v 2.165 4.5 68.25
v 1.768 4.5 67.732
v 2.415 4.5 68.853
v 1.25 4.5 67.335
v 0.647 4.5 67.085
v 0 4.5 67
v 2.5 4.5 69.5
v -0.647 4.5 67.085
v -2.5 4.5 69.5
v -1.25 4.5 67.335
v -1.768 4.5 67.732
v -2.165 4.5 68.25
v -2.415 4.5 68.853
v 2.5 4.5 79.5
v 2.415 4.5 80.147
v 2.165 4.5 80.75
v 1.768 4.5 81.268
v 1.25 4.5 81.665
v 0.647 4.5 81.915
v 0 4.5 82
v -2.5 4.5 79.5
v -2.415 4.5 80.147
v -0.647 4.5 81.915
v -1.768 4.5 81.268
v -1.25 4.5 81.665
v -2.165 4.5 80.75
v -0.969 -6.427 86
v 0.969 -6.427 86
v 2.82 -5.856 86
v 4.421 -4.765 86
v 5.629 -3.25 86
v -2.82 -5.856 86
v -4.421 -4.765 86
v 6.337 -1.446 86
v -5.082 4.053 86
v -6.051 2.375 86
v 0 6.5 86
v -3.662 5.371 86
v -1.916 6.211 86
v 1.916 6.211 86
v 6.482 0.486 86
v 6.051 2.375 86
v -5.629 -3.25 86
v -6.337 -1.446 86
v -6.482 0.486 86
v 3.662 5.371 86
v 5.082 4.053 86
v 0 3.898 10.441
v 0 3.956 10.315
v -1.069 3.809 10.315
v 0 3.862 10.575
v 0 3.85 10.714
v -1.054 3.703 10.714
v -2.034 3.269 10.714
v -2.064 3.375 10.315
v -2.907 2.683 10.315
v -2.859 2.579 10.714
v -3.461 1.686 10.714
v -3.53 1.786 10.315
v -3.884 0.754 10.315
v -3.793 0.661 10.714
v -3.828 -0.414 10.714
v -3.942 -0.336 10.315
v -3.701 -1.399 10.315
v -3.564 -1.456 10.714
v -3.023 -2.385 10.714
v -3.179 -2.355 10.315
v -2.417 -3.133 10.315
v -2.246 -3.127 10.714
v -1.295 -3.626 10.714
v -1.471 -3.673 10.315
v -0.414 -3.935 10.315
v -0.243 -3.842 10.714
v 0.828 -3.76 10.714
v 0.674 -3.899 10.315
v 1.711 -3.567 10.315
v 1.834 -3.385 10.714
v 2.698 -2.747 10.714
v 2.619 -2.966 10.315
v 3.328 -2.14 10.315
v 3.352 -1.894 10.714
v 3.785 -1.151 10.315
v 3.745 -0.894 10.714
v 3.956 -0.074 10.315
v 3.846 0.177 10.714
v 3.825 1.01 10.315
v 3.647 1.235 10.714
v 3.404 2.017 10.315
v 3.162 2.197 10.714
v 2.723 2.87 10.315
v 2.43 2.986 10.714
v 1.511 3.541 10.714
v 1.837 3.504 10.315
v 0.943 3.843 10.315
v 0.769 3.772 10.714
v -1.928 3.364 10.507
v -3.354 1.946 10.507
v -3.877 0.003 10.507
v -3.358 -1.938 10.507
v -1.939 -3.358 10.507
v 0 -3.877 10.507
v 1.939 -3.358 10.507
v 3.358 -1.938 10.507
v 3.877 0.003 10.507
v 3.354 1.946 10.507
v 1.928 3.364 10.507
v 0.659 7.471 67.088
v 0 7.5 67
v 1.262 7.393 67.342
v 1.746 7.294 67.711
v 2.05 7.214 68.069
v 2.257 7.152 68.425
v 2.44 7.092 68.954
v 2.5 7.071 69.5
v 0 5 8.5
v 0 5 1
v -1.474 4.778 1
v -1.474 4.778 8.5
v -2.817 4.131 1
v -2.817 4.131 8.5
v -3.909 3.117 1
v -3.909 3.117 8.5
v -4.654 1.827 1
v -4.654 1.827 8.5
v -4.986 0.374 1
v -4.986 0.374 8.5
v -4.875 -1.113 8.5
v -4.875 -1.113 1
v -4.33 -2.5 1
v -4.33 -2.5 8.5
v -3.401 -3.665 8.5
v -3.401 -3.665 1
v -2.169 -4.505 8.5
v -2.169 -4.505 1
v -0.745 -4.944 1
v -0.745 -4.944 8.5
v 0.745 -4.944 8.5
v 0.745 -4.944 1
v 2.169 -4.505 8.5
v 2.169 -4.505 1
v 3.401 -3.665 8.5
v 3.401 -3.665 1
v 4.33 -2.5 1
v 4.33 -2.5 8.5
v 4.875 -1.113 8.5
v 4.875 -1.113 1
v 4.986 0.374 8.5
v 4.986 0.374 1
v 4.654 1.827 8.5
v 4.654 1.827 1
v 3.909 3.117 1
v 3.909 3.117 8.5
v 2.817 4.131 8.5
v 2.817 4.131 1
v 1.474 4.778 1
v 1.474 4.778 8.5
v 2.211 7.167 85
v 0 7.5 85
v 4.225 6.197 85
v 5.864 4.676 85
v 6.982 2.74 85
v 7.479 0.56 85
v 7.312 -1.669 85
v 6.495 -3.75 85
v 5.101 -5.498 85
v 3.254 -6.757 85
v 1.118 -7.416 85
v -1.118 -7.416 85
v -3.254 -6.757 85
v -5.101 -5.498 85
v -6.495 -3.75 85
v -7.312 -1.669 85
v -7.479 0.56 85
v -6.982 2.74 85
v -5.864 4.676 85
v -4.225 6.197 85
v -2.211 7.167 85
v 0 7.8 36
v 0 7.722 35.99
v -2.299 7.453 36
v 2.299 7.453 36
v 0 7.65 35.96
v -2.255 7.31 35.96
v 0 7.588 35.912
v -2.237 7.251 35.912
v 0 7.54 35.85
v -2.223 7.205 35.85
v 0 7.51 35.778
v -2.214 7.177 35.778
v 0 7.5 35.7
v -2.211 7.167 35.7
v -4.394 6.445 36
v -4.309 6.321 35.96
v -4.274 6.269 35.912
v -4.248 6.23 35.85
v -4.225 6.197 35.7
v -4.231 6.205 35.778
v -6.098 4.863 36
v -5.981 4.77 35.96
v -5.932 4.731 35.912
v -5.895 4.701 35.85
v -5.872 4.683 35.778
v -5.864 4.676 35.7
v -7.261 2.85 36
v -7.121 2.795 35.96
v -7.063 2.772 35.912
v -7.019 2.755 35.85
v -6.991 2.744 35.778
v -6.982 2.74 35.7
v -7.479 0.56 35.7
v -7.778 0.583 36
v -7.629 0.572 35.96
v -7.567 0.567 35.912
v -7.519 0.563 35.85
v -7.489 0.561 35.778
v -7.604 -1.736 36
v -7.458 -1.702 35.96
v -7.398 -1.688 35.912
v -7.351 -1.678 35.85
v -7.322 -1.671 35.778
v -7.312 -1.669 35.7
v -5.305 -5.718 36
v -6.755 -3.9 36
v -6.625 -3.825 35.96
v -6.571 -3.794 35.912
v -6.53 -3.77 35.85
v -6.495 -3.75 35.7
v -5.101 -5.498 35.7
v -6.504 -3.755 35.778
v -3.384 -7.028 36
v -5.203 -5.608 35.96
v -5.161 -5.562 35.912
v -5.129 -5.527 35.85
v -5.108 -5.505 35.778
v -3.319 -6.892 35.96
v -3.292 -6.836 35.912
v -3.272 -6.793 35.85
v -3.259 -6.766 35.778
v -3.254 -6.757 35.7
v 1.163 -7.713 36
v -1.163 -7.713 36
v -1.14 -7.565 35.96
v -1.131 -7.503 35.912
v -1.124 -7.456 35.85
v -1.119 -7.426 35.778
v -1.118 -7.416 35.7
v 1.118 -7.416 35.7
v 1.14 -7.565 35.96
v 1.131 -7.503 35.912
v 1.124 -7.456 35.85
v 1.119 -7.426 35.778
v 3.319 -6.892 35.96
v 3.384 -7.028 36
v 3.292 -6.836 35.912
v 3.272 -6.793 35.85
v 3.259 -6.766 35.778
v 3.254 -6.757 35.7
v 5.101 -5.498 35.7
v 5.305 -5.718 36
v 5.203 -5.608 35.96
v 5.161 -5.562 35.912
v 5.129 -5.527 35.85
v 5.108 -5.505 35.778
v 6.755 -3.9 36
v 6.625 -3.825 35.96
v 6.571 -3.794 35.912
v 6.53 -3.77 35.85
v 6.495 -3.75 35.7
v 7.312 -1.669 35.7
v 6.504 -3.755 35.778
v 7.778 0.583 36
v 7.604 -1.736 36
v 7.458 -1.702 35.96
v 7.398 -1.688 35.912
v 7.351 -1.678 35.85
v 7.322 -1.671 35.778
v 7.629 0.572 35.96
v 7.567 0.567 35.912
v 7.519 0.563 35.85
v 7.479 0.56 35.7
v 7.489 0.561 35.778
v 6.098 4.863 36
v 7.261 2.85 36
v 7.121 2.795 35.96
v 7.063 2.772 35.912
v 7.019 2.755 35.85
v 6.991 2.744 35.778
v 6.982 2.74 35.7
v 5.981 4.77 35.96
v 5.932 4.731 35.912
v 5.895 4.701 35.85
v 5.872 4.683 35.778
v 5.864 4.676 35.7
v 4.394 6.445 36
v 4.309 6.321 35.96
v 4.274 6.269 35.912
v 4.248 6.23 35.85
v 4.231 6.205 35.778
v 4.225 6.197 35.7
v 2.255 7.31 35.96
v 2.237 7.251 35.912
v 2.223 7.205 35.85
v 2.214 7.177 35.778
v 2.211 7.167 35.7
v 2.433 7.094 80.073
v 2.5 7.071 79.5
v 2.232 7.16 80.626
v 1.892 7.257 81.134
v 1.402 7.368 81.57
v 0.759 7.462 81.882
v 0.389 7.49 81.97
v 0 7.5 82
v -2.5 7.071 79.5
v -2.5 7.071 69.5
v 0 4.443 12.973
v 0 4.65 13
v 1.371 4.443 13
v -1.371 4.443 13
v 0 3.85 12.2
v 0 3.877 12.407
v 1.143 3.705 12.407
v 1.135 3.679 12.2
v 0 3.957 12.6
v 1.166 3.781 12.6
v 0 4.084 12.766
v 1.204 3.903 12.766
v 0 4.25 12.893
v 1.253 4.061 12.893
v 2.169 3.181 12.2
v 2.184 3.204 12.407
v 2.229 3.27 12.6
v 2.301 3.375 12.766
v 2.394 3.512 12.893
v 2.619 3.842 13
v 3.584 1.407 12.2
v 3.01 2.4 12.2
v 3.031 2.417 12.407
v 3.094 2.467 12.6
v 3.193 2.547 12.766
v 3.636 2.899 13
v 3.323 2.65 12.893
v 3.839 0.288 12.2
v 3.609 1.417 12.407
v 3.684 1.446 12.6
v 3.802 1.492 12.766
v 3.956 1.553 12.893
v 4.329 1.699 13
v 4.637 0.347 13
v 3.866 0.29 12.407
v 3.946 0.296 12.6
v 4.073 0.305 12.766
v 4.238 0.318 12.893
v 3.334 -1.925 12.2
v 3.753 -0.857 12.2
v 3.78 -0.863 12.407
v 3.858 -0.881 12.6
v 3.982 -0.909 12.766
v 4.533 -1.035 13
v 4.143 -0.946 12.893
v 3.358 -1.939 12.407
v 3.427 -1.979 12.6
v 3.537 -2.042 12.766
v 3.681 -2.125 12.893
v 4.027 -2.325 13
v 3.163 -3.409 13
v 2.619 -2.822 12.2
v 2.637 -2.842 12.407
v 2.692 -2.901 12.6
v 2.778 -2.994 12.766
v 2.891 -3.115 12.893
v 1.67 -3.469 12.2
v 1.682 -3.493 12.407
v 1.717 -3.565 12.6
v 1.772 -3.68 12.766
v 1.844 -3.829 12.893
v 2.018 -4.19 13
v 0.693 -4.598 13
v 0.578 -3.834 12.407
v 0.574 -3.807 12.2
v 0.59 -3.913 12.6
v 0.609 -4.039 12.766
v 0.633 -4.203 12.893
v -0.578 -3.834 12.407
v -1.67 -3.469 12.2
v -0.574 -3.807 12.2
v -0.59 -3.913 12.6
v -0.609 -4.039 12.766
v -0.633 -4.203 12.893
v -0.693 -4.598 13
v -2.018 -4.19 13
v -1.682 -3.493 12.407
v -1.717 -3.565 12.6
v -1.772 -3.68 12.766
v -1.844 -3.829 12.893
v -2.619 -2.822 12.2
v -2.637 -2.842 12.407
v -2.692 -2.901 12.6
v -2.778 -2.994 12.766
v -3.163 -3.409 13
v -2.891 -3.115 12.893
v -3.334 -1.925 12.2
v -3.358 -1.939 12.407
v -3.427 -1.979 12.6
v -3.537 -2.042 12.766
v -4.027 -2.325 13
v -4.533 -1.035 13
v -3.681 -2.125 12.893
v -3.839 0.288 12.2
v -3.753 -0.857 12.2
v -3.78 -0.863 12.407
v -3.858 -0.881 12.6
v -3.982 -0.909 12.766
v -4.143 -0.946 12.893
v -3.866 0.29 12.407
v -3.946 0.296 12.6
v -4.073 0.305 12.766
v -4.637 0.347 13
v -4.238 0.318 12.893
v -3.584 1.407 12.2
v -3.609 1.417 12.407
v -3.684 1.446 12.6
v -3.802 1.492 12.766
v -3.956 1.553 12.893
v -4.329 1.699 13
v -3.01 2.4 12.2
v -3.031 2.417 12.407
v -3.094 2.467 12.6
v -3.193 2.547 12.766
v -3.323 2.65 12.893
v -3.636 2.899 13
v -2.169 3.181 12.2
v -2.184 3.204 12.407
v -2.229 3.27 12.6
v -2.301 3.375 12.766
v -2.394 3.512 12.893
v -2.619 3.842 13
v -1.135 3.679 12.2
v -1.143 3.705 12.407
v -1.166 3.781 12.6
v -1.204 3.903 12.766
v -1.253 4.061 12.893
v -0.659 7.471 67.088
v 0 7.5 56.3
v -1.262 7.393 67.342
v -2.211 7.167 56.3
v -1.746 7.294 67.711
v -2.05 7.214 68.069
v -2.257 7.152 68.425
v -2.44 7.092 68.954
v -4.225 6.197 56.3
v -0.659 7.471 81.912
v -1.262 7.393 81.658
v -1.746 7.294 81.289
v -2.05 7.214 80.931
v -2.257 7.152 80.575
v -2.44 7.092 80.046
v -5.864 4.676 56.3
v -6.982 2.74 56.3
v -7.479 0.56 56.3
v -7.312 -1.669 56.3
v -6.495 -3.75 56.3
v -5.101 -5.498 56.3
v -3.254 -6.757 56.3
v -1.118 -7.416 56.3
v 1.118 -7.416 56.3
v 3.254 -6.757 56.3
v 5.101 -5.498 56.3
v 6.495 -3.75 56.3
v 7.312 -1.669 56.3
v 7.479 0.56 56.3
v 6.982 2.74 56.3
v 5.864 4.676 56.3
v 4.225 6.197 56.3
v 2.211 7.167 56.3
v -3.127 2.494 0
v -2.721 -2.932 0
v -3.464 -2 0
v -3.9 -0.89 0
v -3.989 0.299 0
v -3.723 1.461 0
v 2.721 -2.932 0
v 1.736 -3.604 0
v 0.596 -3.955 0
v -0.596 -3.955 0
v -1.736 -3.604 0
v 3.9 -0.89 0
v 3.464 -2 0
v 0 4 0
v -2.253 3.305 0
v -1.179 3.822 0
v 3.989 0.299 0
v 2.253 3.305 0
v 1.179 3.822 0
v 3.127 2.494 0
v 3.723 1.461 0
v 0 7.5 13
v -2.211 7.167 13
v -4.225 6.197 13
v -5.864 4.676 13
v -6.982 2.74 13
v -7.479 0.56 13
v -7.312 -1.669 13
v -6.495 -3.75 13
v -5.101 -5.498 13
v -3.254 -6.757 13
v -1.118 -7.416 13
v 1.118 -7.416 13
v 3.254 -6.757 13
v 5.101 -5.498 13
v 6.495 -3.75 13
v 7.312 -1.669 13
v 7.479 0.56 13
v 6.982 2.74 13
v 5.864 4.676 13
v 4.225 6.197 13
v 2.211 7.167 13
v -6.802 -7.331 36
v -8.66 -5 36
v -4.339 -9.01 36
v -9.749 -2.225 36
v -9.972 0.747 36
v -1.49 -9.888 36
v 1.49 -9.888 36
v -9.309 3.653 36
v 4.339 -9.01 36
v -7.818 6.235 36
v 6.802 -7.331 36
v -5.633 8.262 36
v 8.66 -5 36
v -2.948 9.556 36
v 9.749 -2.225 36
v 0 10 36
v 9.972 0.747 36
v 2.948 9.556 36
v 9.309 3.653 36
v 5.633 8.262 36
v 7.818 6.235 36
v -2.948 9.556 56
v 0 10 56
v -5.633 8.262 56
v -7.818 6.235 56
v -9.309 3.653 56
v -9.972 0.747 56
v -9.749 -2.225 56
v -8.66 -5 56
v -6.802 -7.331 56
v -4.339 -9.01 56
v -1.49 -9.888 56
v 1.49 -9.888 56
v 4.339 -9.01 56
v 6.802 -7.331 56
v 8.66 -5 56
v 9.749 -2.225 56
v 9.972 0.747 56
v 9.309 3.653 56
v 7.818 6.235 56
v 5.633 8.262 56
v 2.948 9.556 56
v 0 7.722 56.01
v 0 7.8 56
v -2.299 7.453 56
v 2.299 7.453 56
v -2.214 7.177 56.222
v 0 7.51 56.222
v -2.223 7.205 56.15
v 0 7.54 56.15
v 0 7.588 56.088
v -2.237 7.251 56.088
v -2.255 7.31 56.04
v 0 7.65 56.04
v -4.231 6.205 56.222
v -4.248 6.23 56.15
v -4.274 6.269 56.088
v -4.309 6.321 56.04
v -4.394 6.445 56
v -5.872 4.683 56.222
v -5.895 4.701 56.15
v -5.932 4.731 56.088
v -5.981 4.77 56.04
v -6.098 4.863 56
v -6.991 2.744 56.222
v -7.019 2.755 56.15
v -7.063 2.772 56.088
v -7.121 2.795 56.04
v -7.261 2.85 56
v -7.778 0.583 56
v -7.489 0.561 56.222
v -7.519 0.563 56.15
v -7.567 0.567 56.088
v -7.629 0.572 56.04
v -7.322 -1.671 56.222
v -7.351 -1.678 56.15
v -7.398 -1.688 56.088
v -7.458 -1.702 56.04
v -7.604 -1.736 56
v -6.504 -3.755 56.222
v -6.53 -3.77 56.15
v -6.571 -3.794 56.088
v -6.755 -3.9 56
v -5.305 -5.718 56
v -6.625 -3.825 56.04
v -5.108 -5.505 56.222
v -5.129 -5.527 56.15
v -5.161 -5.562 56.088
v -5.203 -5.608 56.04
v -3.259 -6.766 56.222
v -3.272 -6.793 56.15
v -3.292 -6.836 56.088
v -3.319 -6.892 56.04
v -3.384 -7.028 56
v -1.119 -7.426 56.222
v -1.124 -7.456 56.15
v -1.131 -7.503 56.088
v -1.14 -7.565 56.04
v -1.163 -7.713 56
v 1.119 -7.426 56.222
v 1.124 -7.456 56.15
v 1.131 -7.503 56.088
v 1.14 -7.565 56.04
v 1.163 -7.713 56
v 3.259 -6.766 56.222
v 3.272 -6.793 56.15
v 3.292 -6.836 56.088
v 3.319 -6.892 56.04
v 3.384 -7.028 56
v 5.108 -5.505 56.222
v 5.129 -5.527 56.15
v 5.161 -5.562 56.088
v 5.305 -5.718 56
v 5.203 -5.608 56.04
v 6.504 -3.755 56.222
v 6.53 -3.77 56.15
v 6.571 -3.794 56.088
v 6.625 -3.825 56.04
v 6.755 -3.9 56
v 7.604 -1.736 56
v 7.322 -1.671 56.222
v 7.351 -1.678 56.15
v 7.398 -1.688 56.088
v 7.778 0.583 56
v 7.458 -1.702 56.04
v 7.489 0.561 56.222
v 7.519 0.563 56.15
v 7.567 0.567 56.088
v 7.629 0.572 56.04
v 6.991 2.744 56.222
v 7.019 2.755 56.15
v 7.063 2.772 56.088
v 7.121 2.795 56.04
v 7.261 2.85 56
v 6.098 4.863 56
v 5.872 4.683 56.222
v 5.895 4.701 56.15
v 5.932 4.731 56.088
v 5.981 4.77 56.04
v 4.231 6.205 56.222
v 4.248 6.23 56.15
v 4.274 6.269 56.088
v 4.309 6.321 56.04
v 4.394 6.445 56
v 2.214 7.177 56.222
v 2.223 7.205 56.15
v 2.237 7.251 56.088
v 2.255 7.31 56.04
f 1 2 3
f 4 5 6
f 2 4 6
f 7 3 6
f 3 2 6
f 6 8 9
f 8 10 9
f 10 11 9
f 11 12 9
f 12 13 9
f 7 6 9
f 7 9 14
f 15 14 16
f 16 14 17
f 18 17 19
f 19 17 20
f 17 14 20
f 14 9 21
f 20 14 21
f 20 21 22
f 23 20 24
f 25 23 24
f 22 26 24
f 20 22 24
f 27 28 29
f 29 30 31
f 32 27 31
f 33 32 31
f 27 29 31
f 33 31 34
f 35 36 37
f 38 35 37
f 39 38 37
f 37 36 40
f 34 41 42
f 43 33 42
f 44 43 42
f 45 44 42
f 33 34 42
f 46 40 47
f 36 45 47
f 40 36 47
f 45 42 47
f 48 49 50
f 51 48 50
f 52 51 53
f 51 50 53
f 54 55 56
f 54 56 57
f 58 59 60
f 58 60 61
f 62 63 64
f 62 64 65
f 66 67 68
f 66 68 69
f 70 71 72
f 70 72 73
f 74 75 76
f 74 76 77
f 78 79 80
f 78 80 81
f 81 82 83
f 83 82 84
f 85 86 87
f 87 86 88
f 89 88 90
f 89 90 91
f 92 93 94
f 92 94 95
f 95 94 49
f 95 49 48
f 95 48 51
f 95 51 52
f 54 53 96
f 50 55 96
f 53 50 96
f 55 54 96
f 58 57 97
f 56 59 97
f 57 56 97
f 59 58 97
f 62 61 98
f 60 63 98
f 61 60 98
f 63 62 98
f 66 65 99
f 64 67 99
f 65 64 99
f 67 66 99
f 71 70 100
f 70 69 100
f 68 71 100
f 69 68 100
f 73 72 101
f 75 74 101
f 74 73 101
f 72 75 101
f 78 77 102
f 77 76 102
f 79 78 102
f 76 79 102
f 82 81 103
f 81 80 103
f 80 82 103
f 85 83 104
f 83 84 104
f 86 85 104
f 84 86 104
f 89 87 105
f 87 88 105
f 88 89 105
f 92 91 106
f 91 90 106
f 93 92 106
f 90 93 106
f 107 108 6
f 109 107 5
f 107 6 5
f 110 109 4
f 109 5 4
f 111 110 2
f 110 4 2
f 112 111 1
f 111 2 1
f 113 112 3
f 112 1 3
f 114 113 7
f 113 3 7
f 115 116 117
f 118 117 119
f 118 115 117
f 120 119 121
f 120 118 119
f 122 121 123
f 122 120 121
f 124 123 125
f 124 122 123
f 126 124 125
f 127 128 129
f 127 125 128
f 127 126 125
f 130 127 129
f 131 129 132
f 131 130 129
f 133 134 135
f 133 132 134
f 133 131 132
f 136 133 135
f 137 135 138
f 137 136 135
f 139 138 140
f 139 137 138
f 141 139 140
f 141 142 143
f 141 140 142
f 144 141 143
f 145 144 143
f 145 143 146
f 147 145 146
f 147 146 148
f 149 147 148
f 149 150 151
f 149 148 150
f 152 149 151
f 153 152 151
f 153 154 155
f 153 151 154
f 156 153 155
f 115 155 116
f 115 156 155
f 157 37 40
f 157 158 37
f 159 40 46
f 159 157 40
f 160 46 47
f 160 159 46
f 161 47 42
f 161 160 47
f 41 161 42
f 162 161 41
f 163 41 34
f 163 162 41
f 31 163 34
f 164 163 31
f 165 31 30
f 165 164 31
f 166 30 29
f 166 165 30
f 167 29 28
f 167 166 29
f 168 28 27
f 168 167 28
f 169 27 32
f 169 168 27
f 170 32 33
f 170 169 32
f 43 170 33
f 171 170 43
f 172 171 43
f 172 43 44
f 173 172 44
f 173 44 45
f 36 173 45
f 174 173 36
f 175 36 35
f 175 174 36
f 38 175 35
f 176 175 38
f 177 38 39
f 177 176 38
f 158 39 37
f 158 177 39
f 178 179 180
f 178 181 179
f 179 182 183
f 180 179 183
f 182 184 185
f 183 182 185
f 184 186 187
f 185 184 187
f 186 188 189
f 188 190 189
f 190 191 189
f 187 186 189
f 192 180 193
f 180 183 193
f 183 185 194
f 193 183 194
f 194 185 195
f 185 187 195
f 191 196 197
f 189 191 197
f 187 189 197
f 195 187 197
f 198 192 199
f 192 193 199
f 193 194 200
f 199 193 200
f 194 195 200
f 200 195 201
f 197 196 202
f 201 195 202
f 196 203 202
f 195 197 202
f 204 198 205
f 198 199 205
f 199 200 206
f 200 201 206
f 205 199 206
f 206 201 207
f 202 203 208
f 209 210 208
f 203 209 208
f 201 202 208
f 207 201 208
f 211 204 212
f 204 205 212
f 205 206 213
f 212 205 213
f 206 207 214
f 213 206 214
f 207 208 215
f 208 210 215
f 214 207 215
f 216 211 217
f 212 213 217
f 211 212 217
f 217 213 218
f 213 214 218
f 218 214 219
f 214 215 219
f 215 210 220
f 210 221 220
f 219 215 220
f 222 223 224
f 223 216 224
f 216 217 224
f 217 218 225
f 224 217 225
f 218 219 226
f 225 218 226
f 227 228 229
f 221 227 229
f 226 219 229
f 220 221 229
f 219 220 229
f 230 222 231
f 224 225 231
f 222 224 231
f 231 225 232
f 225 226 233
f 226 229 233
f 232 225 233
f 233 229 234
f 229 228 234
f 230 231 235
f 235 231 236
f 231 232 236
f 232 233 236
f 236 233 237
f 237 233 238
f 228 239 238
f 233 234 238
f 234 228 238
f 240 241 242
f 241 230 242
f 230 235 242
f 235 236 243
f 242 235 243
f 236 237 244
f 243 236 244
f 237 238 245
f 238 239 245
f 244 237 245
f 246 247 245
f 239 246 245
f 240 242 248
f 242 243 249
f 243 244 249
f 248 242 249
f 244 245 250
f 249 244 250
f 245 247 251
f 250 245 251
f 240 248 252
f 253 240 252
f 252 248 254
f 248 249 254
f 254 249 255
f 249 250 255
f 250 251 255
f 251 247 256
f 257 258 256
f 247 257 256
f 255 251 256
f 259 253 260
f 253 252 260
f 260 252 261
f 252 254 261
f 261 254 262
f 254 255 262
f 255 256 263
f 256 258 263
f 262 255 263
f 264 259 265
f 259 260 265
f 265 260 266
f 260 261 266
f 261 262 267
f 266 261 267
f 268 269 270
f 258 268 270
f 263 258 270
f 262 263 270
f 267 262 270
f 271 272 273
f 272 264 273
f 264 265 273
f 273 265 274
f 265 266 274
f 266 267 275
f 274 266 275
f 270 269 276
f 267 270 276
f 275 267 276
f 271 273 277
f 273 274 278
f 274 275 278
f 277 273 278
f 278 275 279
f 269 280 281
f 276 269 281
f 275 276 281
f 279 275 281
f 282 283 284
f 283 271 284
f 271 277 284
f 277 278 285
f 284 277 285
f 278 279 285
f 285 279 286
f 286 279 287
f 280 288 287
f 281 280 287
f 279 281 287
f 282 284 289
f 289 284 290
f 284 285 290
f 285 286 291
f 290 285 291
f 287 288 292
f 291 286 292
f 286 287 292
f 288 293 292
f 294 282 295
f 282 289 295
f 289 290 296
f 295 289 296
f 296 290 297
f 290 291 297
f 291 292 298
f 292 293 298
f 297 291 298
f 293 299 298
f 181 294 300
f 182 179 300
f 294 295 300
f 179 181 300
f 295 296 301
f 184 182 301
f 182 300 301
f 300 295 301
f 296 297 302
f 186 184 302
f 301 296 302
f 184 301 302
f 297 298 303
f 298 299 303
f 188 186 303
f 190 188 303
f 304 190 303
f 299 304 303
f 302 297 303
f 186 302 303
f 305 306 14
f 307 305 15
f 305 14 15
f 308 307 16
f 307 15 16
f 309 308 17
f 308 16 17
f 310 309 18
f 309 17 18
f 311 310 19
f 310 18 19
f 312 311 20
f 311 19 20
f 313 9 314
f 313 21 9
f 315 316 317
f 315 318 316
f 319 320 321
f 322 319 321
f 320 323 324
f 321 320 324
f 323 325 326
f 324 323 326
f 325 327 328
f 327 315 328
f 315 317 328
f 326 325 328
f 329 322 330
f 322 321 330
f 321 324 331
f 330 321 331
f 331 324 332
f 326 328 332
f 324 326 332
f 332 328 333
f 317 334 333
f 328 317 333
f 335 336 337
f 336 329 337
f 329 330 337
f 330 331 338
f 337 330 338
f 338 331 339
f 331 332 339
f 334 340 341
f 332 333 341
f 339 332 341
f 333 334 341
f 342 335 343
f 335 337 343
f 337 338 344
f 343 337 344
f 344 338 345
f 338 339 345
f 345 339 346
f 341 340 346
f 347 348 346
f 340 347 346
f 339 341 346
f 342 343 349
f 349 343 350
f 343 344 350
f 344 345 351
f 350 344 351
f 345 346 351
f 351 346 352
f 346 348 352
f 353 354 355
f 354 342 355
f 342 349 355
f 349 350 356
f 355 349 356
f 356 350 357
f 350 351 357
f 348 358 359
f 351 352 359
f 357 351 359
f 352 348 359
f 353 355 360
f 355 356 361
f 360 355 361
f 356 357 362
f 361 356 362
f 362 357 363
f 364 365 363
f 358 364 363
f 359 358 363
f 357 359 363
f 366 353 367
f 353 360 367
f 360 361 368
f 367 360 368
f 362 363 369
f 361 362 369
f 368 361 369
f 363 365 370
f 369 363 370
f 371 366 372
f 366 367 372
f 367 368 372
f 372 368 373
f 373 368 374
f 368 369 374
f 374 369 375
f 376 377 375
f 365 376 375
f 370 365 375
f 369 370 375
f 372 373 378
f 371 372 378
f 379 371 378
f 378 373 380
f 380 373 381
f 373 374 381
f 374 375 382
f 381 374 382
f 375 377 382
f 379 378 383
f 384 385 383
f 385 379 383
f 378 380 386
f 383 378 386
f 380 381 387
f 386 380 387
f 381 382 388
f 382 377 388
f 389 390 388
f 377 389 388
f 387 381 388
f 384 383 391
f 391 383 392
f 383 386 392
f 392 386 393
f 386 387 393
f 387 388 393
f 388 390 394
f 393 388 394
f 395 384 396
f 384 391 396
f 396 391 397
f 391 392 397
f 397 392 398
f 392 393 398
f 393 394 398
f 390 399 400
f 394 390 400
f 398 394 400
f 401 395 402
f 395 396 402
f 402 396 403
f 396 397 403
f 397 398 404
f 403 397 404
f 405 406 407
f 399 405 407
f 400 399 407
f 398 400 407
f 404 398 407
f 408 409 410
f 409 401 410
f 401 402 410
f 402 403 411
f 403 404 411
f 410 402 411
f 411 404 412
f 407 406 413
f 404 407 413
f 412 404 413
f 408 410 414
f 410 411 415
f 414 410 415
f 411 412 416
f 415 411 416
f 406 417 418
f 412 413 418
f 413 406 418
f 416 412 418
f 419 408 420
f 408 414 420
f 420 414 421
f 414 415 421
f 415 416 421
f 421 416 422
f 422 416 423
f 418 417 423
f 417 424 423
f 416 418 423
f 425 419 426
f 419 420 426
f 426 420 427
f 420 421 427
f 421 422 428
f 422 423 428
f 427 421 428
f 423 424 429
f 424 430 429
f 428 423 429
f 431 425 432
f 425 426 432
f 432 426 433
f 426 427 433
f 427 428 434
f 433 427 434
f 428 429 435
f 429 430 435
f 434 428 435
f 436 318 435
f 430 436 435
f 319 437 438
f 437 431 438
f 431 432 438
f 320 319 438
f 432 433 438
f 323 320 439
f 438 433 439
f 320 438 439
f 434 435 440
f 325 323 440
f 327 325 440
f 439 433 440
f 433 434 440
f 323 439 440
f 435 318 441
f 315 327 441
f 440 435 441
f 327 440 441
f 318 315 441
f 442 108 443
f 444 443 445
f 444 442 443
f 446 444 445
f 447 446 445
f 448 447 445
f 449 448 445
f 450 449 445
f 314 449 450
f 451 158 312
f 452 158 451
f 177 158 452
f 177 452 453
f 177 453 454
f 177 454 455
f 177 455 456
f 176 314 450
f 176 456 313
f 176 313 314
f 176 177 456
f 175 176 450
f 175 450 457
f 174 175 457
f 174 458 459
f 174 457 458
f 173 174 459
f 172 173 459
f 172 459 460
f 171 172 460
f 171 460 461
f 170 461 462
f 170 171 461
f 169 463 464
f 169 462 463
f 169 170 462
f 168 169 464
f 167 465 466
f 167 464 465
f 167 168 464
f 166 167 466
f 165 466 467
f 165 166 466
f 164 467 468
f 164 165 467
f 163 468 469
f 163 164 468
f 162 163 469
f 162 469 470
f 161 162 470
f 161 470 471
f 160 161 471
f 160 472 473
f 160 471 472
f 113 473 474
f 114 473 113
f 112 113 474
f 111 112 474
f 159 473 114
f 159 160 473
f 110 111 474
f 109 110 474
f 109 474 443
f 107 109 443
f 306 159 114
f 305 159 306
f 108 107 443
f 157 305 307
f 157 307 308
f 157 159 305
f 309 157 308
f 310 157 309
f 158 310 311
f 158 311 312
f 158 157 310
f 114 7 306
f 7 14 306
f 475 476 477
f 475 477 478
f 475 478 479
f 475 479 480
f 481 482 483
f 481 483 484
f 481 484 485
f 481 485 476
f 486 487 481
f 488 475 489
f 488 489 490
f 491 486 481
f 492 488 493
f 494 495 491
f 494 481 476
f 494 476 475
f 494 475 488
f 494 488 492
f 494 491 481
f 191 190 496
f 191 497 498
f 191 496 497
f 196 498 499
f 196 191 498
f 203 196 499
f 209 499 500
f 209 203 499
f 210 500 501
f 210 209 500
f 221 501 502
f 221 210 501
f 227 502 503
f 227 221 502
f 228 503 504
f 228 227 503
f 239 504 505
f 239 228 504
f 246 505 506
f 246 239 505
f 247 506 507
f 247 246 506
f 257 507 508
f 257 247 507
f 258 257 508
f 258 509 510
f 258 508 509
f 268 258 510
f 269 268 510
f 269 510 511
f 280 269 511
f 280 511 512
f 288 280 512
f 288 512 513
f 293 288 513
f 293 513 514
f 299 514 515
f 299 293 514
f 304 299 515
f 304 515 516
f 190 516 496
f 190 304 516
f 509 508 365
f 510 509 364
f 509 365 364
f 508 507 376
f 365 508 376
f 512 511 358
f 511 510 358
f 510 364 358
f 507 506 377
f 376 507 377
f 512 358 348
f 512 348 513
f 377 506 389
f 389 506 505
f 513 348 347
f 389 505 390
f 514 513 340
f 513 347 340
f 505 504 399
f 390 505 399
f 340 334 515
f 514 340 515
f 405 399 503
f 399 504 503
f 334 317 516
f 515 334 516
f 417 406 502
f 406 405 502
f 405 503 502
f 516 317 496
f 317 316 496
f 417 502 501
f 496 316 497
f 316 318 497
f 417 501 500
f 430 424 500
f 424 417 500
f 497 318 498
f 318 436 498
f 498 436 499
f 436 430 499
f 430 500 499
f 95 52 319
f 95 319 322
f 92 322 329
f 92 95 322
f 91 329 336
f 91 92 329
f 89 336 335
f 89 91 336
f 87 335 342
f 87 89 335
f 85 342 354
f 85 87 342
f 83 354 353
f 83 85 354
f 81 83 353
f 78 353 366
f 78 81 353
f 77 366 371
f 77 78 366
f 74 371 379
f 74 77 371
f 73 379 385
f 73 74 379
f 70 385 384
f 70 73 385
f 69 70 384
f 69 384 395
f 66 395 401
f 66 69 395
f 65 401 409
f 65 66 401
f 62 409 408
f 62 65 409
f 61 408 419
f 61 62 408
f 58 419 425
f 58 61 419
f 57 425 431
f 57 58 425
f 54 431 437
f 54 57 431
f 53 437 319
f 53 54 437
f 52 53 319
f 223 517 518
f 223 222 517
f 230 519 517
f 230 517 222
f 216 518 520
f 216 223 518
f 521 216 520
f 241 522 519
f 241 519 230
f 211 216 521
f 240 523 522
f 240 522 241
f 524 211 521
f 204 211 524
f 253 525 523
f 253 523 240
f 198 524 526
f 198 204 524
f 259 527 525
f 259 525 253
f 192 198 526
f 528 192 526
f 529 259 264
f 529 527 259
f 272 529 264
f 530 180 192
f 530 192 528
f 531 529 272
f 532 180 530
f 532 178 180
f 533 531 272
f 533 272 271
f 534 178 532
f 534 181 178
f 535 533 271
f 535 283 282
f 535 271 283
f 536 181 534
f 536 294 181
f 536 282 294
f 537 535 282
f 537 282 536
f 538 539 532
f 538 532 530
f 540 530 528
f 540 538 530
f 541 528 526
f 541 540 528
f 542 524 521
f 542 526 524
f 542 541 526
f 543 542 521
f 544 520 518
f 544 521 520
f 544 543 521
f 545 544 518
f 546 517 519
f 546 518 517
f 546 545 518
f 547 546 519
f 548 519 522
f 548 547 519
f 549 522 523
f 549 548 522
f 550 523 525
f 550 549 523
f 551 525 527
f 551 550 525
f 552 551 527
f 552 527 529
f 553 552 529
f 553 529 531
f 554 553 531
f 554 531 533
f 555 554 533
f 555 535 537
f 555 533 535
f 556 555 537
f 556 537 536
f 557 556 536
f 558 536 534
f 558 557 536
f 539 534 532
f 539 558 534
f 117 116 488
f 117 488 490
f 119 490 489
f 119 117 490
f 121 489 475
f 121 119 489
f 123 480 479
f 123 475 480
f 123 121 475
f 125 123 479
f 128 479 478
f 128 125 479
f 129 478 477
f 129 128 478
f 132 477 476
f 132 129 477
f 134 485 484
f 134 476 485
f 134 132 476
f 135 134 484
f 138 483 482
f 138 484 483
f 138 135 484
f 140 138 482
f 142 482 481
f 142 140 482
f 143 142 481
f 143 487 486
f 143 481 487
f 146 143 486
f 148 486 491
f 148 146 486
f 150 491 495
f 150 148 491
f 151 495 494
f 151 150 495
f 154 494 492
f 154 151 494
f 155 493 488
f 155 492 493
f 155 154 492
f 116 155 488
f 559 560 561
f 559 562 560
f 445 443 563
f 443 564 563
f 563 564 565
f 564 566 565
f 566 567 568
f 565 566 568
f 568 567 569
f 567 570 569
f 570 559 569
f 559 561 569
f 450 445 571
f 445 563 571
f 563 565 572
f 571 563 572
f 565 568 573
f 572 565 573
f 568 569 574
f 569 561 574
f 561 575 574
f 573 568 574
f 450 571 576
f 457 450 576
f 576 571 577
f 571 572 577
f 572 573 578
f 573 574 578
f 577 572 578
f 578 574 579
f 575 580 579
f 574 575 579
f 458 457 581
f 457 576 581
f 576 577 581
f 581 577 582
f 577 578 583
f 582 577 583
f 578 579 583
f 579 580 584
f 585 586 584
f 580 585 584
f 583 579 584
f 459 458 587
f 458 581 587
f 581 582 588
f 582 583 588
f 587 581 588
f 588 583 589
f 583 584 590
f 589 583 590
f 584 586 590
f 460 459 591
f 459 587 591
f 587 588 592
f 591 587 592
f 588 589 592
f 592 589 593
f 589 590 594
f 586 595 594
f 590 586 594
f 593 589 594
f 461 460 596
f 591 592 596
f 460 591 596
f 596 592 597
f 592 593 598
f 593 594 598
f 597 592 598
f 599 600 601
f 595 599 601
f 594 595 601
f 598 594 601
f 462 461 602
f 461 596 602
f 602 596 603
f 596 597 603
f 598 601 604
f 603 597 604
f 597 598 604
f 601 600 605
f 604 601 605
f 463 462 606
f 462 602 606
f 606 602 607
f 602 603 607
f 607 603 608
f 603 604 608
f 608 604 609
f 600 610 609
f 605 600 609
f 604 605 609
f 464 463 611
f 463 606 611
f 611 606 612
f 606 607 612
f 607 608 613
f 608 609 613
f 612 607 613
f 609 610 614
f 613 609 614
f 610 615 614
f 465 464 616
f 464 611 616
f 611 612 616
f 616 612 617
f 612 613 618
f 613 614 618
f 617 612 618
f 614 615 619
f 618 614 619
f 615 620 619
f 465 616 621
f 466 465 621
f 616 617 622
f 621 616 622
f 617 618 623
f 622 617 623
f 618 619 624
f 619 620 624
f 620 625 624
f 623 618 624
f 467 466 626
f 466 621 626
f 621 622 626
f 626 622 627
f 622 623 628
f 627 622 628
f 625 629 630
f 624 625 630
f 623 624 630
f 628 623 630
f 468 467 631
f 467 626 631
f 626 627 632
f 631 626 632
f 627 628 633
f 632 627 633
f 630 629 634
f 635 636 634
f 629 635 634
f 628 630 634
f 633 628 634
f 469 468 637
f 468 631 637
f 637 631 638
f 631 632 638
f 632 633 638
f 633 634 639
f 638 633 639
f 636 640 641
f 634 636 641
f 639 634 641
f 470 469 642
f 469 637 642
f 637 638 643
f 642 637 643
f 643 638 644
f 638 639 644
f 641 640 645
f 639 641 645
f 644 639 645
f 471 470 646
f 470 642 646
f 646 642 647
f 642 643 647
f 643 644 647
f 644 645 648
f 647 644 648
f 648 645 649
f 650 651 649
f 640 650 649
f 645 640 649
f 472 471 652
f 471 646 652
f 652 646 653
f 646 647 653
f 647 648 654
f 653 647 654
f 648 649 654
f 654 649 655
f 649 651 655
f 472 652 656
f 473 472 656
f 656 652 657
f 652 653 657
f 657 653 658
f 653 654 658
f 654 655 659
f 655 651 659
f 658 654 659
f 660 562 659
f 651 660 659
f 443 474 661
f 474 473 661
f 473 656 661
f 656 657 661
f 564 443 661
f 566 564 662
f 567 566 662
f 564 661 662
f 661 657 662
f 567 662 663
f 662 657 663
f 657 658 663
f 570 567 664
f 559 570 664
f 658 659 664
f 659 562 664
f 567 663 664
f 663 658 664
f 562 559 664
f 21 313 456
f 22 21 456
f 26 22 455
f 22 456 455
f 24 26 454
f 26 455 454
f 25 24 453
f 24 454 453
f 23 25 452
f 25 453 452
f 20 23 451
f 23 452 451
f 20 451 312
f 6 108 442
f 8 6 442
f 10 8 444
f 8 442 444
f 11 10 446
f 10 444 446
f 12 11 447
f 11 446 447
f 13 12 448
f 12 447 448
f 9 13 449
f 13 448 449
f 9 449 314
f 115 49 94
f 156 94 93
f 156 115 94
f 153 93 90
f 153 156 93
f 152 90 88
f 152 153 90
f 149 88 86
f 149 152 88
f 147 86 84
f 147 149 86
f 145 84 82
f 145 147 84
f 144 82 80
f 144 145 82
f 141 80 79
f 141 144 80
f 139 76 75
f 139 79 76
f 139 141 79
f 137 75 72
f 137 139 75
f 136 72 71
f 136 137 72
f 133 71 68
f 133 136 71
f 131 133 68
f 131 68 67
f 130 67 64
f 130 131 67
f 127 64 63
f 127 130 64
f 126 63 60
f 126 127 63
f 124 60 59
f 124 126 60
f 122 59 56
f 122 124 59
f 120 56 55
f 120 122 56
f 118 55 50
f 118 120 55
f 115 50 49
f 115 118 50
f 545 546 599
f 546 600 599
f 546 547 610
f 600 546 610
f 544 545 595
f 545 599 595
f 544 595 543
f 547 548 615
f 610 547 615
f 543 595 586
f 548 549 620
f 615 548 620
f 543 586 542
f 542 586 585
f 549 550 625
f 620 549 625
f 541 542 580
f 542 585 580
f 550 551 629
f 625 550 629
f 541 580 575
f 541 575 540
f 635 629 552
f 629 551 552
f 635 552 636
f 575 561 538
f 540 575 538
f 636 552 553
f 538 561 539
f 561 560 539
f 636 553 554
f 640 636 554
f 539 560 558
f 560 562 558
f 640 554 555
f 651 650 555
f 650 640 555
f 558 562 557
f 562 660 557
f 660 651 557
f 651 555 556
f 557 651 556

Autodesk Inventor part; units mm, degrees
ref_plane "YZ Plane" through (0, 0, 0) normal (1, 0, 0) x (0, 1, 0)
ref_plane "XZ Plane" through (0, 0, 0) normal (0, 1, 0) x (-1, 0, 0)
ref_plane "XY Plane" through (0, 0, 0) normal (0, 0, 1) x (1, 0, 0)
sketch "스케치1" plane through (0, 0, 0) normal (1, 0, 0) x (0, 1, 0)
  line L0 (0, 0) -> (5, 0)
  line L1 (5, 0) -> (5, 13)
  line L2 (5, 13) -> (0, 13)
  line L3 (0, 13) -> (0, 0)
  line L4 (0, 13) -> (7.5, 13)
  line L5 (7.5, 13) -> (7.5, 36)
  line L6 (7.5, 36) -> (0, 36)
  line L7 (0, 36) -> (0, 13)
  line L8 (0, 36) -> (10, 36)
  line L9 (10, 36) -> (10, 56)
  line L10 (10, 56) -> (0, 56)
  line L11 (0, 56) -> (0, 36)
  line L12 (0, 56) -> (7.5, 56)
  line L13 (7.5, 56) -> (7.5, 86)
  line L14 (7.5, 86) -> (0, 86)
  line L15 (0, 86) -> (0, 56)
  dimension "d0" = 10
  dimension "d1" = 15
  dimension "d2" = 20
  dimension "d3" = 15
  dimension "d4" = 13
  dimension "d5" = 23
  dimension "d6" = 20
  dimension "d7" = 30
revolve "회전1" add sketch "스케치1" angle 360 about axis through (0, 0, 36) along (0, 0, -1)
sketch "스케치2" plane through (0, 0, 0) normal (1, 0, 0) x (0, 1, 0)
  line L0 (5, 8.5) -> (5, 13)
  line L1 (5, 13) -> (3.85, 13)
  line L2 (3.85, 13) -> (3.85, 10.5)
  line L3 (3.85, 10.5) -> (5, 8.5)
  line L4 (-5, 13) -> (5, 13) projected
  line L5 (0, -17.2) -> (0, 103.2) projected
  point P0 (0, 0)
  dimension "d9" = 4.5
  dimension "d10" = 1.15
  dimension "d11" = 2.5
revolve "회전3" cut sketch "스케치2" angle 360 about axis through (0, 0, -10) along (0, 0, 1)
fillet "모깎기1" radius 0.8 2 edges at (0, -3.85, 10.5) (0, -3.85, 13)
thread "스레드1" size "M10x1.5" class "6g" standard "ANSI Metric M Profile" full length
chamfer "모따기1" distance 1 angle 45 2 edges at (0, -5, 0) (0, -7.5, 86)
sketch "스케치3" plane through (0, 0, 0) normal (1, 0, 0) x (0, 1, 0)
  line L0 (11.8435, 67) -> (4.5, 67)
  line L1 (4.5, 67) -> (4.5, 82)
  line L2 (4.5, 82) -> (11.8435, 82)
  line L3 (11.8435, 82) -> (11.8435, 67)
  line L4 (-7.5, 86) -> (7.5, 86) projected
  line L5 (7.5, 86) -> (7.5, 56) projected
  point P0 (0, 0)
  dimension "d20" = 15
  dimension "d21" = 4
  dimension "d22" = 3
extrude "돌출1" cut sketch "스케치3" along normal mid plane 5
fillet "모깎기2" radius 2.5 4 edges at (2.5, 5.7855, 67) (-2.5, 5.7855, 67) (-2.5, 5.7855, 82) (2.5, 5.7855, 82)
fillet "모깎기3" radius 0.3 2 edges at (0, -7.5, 36) (0, -7.5, 56)
properties part number "3강 축1"
